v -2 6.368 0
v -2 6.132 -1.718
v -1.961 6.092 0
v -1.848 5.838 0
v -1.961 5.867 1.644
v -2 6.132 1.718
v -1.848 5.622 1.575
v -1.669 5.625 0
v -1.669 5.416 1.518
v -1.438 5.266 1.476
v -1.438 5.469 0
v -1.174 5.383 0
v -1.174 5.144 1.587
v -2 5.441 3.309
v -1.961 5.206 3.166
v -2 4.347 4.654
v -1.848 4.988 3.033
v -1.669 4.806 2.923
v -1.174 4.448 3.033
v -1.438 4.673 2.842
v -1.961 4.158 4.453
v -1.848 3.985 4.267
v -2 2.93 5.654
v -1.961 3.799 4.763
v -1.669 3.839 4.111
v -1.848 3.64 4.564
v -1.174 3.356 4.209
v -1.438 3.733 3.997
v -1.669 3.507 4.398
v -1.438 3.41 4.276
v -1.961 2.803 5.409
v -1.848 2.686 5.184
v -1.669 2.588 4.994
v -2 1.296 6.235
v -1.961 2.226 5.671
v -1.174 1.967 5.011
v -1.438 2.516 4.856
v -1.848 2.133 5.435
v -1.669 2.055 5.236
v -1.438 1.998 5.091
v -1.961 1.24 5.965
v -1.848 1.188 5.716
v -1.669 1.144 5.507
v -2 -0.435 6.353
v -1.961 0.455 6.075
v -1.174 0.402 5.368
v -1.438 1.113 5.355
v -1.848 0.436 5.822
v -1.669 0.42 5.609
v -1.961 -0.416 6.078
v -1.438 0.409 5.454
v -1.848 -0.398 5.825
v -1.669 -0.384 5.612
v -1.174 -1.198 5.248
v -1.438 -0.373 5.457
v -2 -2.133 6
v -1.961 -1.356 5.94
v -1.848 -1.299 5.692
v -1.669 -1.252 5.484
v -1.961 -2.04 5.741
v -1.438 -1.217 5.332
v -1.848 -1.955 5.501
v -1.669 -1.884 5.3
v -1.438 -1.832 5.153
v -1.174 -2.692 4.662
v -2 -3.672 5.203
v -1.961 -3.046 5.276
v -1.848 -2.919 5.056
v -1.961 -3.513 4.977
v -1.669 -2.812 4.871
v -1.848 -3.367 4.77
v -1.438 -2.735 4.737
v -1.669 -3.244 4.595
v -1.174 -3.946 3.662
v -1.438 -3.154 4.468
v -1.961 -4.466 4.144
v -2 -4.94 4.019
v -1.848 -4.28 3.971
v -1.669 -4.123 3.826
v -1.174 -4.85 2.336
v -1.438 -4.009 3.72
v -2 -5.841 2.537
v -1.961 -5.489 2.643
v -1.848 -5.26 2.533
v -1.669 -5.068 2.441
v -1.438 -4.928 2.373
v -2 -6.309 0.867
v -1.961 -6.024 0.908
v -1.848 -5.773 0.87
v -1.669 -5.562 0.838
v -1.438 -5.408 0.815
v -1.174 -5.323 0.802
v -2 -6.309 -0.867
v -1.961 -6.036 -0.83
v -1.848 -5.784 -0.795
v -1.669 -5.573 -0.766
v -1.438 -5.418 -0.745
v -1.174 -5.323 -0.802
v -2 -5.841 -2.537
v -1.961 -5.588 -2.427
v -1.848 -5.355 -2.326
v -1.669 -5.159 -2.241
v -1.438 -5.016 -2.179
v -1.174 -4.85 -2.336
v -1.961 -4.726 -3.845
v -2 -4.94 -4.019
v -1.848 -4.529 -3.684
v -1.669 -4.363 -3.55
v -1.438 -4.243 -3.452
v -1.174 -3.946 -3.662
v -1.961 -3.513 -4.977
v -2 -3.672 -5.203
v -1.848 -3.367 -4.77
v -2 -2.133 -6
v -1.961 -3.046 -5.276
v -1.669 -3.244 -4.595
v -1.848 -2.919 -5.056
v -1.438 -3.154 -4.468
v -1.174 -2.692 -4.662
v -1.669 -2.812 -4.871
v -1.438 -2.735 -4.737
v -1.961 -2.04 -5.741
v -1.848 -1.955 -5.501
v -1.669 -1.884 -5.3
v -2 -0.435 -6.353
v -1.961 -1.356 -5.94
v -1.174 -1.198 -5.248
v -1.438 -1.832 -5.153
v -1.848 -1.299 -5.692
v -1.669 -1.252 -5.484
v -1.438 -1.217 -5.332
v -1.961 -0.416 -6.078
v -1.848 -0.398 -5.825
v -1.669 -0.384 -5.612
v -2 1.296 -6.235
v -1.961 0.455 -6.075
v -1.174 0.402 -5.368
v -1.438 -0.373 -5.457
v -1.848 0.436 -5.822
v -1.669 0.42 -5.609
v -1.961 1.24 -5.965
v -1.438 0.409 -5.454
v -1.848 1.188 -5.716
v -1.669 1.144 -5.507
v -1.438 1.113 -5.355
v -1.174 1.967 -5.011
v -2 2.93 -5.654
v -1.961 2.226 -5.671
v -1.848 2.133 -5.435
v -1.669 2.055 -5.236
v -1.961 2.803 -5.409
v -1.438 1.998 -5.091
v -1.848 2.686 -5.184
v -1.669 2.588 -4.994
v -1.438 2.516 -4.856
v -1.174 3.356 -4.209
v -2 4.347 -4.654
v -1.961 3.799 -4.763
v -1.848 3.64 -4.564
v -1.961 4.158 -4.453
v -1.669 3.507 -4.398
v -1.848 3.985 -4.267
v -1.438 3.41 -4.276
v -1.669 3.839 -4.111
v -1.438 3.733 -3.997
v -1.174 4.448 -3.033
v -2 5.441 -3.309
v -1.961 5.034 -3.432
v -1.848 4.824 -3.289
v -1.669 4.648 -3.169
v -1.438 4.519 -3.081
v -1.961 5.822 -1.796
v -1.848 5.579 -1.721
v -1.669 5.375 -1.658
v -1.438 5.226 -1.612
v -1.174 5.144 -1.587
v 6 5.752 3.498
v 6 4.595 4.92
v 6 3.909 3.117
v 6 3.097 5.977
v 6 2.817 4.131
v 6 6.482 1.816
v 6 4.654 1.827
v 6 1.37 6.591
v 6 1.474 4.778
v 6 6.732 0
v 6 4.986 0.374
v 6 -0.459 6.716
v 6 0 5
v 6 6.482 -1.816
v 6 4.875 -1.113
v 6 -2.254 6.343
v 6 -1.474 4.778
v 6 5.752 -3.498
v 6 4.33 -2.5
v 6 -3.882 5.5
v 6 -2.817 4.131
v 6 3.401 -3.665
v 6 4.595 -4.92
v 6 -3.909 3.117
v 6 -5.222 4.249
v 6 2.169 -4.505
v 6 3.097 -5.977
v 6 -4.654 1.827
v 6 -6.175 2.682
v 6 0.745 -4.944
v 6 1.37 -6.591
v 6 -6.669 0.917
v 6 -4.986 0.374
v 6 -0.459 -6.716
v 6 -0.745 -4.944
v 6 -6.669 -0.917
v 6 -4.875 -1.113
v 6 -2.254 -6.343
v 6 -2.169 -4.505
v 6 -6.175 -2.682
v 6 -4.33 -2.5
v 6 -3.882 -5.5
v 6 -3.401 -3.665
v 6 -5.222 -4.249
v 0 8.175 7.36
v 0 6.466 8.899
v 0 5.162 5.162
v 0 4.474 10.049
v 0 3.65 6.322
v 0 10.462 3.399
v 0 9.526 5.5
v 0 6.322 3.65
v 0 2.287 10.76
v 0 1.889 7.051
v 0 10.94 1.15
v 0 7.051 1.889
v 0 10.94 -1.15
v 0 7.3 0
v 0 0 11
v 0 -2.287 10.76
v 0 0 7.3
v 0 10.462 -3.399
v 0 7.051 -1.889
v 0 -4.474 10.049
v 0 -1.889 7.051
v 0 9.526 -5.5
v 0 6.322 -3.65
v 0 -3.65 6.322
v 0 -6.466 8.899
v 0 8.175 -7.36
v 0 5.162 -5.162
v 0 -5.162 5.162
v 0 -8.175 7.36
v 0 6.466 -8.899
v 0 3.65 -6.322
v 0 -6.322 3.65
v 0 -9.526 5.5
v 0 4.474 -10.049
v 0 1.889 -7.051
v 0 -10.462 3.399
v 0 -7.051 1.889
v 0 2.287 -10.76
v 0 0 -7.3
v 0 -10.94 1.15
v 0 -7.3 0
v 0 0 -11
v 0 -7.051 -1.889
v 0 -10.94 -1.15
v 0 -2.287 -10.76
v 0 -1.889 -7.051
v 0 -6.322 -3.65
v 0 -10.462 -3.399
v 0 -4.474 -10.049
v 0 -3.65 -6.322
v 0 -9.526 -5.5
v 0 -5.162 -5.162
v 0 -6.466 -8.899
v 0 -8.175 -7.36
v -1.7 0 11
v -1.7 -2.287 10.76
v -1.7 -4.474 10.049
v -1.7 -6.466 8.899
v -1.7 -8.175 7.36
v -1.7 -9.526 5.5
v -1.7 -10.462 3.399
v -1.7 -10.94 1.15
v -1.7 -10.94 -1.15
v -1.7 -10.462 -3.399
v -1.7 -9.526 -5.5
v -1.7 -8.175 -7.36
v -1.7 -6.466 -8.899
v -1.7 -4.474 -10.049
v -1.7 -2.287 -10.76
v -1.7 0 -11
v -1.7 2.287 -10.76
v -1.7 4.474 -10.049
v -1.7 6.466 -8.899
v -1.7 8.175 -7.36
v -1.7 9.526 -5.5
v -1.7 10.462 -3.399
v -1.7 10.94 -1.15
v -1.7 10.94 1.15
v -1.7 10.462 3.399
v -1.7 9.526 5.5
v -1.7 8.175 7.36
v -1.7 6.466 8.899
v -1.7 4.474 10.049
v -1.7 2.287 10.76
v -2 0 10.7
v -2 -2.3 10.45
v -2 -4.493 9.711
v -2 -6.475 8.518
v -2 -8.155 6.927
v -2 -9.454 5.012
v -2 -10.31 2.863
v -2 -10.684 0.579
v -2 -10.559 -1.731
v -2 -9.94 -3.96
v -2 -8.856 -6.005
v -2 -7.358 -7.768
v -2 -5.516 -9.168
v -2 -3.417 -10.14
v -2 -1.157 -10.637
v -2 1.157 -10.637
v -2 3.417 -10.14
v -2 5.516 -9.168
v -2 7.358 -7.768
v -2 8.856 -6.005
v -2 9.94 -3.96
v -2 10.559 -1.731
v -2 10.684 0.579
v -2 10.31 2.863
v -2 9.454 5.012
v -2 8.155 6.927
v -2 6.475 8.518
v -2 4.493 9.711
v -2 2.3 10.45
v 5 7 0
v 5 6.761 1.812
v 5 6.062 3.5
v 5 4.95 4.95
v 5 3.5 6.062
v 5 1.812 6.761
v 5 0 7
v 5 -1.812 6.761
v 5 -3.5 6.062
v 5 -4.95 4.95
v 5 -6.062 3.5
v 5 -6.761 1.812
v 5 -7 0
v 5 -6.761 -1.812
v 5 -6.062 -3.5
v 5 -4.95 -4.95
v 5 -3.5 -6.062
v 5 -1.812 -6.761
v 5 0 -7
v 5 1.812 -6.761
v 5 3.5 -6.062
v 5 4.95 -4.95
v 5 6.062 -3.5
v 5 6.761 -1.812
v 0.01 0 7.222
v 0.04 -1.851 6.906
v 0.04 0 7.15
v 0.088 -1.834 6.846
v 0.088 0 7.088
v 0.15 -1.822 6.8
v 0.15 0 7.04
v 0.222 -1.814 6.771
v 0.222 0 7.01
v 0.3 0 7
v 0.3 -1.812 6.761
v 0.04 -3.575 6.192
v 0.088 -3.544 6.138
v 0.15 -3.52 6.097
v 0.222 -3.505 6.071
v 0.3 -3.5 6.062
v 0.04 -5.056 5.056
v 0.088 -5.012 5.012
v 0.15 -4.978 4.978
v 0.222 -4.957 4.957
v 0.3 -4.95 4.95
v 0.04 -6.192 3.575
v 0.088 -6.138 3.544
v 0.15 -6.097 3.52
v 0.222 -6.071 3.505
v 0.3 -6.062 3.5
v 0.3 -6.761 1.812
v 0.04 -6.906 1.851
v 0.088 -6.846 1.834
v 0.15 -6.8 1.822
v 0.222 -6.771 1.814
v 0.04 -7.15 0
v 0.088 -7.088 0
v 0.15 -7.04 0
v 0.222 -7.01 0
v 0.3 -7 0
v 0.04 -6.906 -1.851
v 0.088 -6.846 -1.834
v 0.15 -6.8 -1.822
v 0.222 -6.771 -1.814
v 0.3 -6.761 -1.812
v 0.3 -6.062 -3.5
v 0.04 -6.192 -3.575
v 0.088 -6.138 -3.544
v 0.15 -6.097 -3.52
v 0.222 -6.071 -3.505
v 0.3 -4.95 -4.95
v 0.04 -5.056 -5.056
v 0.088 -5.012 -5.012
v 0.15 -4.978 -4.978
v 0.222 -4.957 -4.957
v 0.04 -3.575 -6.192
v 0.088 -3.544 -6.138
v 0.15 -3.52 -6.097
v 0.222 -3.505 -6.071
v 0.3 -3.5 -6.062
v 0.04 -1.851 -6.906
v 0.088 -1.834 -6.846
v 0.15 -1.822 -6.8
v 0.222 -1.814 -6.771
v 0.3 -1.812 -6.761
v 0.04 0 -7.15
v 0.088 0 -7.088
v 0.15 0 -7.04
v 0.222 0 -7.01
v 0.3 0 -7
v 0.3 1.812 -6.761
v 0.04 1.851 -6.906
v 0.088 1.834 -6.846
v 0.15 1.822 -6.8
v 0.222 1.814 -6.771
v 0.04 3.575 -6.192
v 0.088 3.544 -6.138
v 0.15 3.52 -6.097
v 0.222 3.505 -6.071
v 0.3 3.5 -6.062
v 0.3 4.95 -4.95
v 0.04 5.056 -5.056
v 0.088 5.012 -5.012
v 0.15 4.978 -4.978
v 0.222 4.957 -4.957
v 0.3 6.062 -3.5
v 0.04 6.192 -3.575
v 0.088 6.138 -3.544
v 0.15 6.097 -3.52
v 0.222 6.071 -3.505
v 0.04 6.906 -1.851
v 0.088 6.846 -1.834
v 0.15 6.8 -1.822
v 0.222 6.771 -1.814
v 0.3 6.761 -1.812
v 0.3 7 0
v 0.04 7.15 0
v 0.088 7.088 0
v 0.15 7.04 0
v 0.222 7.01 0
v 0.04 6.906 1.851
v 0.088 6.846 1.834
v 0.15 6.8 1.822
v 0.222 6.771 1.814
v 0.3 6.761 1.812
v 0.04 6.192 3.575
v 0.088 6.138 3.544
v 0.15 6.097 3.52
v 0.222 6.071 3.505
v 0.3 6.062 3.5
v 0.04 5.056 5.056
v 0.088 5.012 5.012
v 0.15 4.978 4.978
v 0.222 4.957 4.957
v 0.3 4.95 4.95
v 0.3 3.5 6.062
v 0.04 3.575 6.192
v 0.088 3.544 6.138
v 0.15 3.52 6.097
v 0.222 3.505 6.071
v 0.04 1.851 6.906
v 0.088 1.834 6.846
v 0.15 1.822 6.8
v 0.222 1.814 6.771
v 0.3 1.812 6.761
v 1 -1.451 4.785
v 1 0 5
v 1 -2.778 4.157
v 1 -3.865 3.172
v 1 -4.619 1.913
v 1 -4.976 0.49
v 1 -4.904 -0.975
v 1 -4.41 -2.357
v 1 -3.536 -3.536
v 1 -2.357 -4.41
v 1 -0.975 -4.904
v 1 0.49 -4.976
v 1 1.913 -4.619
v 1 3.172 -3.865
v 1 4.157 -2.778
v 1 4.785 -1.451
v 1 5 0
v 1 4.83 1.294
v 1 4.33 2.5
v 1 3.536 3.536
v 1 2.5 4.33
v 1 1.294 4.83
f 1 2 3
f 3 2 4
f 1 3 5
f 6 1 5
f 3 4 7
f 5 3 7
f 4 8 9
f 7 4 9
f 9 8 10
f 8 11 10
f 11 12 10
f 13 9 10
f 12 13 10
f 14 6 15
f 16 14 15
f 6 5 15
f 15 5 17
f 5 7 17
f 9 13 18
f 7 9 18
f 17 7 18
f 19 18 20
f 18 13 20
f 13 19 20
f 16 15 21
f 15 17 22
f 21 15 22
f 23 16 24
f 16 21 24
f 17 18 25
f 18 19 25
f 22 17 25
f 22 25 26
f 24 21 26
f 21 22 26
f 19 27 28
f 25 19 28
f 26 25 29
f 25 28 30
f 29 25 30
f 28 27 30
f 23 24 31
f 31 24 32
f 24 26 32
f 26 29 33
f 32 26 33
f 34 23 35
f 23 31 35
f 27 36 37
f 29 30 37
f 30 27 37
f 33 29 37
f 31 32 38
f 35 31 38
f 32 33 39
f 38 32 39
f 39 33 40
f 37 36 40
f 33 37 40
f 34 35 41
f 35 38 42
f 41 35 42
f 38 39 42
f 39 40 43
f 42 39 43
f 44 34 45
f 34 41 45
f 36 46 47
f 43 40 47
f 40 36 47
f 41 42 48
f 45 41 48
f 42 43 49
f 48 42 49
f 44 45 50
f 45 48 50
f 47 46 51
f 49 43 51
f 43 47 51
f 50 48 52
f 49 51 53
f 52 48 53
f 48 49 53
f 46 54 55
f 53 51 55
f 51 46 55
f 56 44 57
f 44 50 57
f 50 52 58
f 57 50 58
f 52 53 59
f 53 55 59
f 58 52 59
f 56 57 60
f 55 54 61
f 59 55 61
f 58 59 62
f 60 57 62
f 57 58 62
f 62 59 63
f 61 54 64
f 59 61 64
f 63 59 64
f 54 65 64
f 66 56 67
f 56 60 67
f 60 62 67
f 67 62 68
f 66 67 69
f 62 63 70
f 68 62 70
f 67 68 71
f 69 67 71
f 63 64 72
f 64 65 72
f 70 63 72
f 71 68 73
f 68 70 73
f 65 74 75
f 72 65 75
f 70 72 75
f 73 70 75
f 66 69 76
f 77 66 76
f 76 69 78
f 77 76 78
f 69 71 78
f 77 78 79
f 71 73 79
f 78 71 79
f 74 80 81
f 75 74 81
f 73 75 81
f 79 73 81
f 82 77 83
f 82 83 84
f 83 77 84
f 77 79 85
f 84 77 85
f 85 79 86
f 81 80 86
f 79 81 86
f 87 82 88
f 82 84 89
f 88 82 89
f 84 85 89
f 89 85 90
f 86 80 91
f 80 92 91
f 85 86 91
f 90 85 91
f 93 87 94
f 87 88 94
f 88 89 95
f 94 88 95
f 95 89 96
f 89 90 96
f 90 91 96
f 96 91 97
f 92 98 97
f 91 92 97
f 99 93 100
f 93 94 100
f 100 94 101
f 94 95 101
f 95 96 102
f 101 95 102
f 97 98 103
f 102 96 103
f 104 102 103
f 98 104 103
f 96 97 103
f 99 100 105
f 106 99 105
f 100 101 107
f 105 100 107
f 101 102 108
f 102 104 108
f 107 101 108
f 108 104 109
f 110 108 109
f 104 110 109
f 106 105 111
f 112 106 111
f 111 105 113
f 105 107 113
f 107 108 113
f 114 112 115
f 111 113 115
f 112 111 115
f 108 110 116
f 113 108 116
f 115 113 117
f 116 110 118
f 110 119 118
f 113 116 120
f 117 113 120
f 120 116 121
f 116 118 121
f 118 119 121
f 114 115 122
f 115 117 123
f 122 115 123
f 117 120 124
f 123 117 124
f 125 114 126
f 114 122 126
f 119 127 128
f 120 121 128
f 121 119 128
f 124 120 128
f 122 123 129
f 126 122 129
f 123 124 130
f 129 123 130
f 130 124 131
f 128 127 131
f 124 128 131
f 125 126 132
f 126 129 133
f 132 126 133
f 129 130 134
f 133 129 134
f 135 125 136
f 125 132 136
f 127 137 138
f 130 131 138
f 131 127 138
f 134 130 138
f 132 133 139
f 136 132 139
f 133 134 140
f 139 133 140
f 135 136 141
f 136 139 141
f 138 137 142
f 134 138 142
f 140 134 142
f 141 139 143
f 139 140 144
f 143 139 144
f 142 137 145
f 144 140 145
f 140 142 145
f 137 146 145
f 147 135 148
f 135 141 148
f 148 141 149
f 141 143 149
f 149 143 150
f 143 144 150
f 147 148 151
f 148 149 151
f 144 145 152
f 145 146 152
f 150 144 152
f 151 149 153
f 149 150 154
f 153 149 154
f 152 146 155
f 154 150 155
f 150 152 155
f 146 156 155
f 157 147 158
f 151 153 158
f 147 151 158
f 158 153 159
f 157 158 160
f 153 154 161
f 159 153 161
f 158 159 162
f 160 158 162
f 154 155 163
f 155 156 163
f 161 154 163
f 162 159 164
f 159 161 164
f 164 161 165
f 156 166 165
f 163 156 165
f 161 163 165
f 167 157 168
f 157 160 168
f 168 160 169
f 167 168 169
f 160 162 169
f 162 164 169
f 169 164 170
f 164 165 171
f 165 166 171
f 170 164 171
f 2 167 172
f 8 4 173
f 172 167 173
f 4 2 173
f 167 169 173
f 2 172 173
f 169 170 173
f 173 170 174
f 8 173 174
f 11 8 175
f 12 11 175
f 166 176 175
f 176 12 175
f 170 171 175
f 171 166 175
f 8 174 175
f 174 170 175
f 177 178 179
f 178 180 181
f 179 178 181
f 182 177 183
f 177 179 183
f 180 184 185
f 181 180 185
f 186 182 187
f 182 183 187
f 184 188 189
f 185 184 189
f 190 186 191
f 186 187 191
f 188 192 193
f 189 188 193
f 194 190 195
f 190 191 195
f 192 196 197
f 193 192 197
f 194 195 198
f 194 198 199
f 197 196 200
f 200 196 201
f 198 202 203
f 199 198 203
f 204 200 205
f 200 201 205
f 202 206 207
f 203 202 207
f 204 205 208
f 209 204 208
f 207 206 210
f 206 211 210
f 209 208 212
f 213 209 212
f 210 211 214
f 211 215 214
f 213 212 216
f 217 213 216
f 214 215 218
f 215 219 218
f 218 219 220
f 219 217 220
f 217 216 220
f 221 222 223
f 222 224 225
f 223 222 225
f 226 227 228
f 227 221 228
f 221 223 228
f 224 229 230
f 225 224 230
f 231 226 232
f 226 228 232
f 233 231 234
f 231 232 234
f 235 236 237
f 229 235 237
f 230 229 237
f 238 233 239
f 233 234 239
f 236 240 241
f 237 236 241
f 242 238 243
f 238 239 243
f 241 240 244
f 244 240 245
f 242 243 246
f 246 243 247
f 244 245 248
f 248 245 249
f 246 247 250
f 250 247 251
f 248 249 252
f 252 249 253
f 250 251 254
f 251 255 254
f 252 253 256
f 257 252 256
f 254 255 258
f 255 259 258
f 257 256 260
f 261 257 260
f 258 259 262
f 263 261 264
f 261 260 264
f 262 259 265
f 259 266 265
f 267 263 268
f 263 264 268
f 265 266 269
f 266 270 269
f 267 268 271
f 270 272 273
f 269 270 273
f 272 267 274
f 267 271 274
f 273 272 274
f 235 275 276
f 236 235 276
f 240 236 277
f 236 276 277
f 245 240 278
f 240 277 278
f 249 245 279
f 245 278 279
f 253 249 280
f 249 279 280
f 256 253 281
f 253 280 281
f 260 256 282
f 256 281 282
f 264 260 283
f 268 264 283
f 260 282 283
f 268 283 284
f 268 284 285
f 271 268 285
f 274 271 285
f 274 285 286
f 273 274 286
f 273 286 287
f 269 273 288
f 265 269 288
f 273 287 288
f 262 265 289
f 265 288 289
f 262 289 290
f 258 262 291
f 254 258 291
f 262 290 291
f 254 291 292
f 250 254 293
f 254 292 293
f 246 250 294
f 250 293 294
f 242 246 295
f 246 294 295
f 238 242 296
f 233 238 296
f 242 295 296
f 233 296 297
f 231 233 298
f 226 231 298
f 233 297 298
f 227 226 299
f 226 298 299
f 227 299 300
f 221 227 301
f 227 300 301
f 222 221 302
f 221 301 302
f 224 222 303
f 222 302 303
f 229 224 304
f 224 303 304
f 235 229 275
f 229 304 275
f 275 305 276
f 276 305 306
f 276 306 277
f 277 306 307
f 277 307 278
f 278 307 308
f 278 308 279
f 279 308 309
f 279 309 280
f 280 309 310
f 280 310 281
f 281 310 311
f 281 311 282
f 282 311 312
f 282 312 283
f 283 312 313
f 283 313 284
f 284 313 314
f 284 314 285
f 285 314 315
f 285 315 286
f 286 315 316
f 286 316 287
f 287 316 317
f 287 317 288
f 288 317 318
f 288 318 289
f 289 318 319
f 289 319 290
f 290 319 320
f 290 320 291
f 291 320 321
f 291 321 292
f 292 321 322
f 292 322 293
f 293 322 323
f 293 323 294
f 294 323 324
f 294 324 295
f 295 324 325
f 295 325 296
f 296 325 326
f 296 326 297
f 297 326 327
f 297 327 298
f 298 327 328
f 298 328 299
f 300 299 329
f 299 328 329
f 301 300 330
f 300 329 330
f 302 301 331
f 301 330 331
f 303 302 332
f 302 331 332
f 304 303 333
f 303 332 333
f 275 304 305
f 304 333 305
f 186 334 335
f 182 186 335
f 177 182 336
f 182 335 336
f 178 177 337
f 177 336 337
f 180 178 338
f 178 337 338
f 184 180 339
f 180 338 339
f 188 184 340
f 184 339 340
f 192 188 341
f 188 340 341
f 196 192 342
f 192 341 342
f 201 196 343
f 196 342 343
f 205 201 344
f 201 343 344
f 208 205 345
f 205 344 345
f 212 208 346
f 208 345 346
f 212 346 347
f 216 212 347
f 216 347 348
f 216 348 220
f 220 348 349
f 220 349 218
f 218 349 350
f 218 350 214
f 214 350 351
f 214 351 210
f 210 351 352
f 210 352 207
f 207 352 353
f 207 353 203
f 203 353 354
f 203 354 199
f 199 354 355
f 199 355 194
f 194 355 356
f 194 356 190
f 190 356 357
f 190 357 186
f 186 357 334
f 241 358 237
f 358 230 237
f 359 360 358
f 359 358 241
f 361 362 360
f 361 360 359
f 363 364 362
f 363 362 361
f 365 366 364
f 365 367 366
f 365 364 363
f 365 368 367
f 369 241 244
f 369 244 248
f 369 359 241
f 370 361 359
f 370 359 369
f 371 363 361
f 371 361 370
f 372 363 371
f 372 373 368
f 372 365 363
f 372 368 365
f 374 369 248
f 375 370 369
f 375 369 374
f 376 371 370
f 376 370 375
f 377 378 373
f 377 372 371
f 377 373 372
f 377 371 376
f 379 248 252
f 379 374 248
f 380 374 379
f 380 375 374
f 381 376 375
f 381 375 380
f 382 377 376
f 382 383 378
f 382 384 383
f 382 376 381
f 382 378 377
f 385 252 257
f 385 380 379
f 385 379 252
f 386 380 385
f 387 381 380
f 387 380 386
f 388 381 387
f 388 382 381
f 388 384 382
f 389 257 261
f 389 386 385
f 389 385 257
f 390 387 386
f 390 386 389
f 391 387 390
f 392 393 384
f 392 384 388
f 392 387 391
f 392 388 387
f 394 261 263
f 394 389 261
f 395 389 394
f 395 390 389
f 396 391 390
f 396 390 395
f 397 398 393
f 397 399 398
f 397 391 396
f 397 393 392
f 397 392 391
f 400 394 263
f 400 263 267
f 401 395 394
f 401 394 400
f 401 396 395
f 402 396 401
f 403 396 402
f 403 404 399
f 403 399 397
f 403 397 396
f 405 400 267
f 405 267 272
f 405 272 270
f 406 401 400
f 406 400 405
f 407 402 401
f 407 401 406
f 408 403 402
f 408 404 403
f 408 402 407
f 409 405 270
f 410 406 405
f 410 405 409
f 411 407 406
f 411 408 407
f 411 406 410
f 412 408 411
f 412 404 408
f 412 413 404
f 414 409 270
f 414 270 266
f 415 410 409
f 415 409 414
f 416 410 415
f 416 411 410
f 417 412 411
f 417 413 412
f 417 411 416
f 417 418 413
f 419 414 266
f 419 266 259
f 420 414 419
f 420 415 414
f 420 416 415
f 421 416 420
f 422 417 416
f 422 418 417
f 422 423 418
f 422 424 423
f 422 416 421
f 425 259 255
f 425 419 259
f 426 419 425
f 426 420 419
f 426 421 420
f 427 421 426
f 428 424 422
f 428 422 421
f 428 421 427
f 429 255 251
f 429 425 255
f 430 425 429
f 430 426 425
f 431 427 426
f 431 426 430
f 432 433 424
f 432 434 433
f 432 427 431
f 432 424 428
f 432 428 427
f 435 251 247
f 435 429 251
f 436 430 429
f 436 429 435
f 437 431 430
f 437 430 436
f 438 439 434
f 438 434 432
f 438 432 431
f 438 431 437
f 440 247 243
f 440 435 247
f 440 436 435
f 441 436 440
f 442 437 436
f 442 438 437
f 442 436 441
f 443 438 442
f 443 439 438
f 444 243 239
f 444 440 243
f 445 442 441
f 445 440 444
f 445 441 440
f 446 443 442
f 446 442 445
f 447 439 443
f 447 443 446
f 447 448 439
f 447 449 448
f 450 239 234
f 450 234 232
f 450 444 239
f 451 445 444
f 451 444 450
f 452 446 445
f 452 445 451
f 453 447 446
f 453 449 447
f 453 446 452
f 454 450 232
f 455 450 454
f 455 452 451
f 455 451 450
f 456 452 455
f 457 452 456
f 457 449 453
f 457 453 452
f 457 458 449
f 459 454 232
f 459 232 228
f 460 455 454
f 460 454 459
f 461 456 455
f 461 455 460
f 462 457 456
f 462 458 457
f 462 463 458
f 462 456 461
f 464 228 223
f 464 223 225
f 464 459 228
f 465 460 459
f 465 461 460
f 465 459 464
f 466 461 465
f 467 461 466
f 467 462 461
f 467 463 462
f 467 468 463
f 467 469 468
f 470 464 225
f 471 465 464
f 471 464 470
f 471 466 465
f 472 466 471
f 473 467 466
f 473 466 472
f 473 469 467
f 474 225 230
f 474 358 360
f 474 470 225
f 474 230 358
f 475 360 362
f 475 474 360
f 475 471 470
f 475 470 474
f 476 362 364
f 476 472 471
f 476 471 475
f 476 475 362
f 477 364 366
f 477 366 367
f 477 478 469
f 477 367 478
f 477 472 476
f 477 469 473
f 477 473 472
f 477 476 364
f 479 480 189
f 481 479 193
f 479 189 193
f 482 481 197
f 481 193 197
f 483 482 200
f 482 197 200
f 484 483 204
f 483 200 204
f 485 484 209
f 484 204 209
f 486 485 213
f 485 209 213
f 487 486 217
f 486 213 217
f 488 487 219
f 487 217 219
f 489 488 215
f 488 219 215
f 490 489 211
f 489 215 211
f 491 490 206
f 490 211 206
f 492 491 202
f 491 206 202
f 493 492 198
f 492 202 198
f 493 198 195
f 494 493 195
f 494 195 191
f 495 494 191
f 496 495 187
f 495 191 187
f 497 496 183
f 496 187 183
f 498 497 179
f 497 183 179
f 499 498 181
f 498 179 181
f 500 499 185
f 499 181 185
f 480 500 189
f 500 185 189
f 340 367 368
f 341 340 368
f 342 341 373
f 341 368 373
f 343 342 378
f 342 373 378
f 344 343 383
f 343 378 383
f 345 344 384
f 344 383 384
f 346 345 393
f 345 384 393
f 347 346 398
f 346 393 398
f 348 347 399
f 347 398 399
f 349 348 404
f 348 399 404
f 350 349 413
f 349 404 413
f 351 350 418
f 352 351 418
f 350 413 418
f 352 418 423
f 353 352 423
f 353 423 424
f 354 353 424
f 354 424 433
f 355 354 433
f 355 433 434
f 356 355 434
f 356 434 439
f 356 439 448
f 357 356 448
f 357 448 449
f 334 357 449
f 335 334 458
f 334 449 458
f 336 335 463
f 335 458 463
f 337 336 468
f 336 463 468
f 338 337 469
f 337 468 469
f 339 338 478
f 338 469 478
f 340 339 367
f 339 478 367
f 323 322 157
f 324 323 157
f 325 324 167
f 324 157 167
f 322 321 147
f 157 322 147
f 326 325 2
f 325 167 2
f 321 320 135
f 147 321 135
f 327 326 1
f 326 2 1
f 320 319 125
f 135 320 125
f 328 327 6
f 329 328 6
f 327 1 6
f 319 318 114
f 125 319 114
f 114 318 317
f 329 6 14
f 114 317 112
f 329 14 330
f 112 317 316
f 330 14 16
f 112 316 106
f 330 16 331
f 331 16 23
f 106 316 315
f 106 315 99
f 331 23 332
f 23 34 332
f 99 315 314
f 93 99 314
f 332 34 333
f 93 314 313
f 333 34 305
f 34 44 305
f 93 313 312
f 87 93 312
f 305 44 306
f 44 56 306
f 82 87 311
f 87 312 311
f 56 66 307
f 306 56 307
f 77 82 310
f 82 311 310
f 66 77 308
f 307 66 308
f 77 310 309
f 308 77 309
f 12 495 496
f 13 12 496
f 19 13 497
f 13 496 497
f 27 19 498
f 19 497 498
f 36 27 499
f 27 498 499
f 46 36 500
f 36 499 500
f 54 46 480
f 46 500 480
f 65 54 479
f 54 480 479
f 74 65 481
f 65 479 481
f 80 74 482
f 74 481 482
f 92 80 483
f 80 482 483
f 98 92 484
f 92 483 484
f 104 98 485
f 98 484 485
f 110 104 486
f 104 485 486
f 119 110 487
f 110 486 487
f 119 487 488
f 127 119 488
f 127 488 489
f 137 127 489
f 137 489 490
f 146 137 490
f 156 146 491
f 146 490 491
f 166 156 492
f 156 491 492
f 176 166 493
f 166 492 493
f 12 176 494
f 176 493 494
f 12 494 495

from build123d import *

# Parameters (mm, degrees)
CHAMFER1_SIZE  = 0.3
FILLET1_R      = 0.3
CHAMFER2_SIZE  = 3
CHAMFER2_SIZE2 = 0.528980942
CHAMFER3_SIZE  = 1
CHAMFER3_SIZE2 = 0.267949192
FILLET2_R      = 1


with BuildPart() as part:
    # Sketch1 → Revolve1 (revolve)
    with BuildSketch(Plane.XY):
        Polygon((-2, 5), (6, 5), (6, 7), (0, 7), (0, 11), (-2, 11), align=None)
    revolve(axis=Axis((-2, 0, 0), (1, 0, 0)))

    # Chamfer1
    chamfer1_edges = [part.edges().sort_by_distance(p)[0] for p in [
        (-2, -11, 0),
    ]]
    chamfer(chamfer1_edges, length=CHAMFER1_SIZE)

    # Fillet1
    fillet1_edges = [part.edges().sort_by_distance(p)[0] for p in [
        (0, -7, 0),
    ]]
    fillet(fillet1_edges, radius=FILLET1_R)

    # Chamfer2
    chamfer2_edges = [part.edges().sort_by_distance(p)[0] for p in [
        (-2, -5, 0),
    ]]
    chamfer2_side = [part.faces().sort_by_distance(p)[0] for p in [
        (2, -5, 0),
    ]]
    chamfer(chamfer2_edges, length=CHAMFER2_SIZE, length2=CHAMFER2_SIZE2, reference=chamfer2_side[0])

    # Chamfer3
    chamfer3_edges = [part.edges().sort_by_distance(p)[0] for p in [
        (6, -7, 0),
    ]]
    chamfer3_side = [part.faces().sort_by_distance(p)[0] for p in [
        (3.15, -7, 0),
    ]]
    chamfer(chamfer3_edges, length=CHAMFER3_SIZE, length2=CHAMFER3_SIZE2, reference=chamfer3_side[0])

    # Fillet2
    fillet2_edges = [part.edges().sort_by_distance(p)[0] for p in [
        (-2, -5.528980942, 0),
    ]]
    fillet(fillet2_edges, radius=FILLET2_R)


solid = part.part
